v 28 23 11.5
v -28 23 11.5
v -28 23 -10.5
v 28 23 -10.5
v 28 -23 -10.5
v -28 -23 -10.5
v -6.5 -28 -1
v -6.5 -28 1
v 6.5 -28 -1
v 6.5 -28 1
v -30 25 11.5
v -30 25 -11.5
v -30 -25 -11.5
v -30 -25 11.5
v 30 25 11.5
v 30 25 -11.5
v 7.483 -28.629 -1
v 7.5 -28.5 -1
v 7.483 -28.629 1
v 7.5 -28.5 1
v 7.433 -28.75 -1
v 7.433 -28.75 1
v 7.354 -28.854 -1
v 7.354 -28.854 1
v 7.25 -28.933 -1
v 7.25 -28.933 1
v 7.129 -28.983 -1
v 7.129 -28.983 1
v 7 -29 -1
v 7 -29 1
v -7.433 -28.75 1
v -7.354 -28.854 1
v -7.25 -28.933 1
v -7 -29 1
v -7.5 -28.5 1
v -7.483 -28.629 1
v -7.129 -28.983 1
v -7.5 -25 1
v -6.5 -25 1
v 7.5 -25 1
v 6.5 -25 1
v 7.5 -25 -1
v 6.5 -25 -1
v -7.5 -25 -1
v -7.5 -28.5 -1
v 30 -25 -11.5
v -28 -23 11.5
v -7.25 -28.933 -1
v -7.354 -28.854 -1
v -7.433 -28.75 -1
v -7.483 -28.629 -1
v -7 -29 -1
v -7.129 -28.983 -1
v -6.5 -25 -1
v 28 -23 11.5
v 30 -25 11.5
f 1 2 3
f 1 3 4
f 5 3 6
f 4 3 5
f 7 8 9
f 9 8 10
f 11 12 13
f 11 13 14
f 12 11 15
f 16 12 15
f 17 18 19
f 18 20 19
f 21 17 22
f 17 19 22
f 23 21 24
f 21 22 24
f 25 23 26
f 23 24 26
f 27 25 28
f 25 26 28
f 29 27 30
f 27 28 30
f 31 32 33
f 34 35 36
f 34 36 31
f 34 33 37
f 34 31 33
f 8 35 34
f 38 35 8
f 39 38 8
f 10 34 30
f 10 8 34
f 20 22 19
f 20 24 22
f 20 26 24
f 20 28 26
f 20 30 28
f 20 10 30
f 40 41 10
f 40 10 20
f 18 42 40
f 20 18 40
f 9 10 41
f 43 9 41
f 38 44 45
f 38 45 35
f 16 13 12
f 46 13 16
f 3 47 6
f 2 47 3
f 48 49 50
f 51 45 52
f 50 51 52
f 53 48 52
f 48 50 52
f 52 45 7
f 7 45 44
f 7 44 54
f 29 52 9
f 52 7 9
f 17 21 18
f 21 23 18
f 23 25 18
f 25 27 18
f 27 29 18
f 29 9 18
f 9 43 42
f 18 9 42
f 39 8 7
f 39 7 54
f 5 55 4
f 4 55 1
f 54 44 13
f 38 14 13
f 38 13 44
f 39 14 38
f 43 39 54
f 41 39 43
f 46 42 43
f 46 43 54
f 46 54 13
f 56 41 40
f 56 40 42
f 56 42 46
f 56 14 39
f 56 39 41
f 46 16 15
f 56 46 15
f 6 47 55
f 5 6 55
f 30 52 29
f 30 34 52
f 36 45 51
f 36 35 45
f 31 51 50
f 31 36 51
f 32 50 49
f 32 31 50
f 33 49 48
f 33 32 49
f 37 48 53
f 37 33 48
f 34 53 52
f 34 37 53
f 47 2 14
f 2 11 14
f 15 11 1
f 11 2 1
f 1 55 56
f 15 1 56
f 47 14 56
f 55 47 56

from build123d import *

# Parameters (mm, degrees)
F0_W     = 60
F0_H     = 23
F1_DEPTH = 25
F2_W     = 56
F2_H     = 46
F3_DEPTH = 22
F4_W     = 15
F4_H     = 2
F5_DEPTH = 4
F6_W     = 13
F6_H     = 3
F7_DEPTH = 2
F8_R     = 0.5


with BuildPart() as f1:
    # F0 (on Front) → F1 (new body, symmetric)
    with BuildSketch(Plane.XZ):
        Rectangle(F0_W, F0_H)
    extrude(amount=F1_DEPTH, both=True)

    # F2 (on face) → F3 (cut)
    with BuildSketch(Plane.XY.offset(11.5)):
        Rectangle(F2_W, F2_H)
    extrude(amount=-F3_DEPTH, mode=Mode.SUBTRACT)

    # F4 (on face) → F5 (join)
    with BuildSketch(Plane.XZ.offset(25)):
        Rectangle(F4_W, F4_H)
    extrude(amount=F5_DEPTH)

    # F6 (on face) → F7 (cut)
    with BuildSketch(Plane.XY.offset(1)):
        with Locations((0, -26.5)):
            Rectangle(F6_W, F6_H)
    extrude(amount=-F7_DEPTH, mode=Mode.SUBTRACT)

    # F8
    f8_edges = [f1.edges().sort_by_distance(p)[0] for p in [
        (-7.5, -29, 0),
        (7.5, -29, 0),
    ]]
    fillet(f8_edges, radius=F8_R)


solid = f1.part
